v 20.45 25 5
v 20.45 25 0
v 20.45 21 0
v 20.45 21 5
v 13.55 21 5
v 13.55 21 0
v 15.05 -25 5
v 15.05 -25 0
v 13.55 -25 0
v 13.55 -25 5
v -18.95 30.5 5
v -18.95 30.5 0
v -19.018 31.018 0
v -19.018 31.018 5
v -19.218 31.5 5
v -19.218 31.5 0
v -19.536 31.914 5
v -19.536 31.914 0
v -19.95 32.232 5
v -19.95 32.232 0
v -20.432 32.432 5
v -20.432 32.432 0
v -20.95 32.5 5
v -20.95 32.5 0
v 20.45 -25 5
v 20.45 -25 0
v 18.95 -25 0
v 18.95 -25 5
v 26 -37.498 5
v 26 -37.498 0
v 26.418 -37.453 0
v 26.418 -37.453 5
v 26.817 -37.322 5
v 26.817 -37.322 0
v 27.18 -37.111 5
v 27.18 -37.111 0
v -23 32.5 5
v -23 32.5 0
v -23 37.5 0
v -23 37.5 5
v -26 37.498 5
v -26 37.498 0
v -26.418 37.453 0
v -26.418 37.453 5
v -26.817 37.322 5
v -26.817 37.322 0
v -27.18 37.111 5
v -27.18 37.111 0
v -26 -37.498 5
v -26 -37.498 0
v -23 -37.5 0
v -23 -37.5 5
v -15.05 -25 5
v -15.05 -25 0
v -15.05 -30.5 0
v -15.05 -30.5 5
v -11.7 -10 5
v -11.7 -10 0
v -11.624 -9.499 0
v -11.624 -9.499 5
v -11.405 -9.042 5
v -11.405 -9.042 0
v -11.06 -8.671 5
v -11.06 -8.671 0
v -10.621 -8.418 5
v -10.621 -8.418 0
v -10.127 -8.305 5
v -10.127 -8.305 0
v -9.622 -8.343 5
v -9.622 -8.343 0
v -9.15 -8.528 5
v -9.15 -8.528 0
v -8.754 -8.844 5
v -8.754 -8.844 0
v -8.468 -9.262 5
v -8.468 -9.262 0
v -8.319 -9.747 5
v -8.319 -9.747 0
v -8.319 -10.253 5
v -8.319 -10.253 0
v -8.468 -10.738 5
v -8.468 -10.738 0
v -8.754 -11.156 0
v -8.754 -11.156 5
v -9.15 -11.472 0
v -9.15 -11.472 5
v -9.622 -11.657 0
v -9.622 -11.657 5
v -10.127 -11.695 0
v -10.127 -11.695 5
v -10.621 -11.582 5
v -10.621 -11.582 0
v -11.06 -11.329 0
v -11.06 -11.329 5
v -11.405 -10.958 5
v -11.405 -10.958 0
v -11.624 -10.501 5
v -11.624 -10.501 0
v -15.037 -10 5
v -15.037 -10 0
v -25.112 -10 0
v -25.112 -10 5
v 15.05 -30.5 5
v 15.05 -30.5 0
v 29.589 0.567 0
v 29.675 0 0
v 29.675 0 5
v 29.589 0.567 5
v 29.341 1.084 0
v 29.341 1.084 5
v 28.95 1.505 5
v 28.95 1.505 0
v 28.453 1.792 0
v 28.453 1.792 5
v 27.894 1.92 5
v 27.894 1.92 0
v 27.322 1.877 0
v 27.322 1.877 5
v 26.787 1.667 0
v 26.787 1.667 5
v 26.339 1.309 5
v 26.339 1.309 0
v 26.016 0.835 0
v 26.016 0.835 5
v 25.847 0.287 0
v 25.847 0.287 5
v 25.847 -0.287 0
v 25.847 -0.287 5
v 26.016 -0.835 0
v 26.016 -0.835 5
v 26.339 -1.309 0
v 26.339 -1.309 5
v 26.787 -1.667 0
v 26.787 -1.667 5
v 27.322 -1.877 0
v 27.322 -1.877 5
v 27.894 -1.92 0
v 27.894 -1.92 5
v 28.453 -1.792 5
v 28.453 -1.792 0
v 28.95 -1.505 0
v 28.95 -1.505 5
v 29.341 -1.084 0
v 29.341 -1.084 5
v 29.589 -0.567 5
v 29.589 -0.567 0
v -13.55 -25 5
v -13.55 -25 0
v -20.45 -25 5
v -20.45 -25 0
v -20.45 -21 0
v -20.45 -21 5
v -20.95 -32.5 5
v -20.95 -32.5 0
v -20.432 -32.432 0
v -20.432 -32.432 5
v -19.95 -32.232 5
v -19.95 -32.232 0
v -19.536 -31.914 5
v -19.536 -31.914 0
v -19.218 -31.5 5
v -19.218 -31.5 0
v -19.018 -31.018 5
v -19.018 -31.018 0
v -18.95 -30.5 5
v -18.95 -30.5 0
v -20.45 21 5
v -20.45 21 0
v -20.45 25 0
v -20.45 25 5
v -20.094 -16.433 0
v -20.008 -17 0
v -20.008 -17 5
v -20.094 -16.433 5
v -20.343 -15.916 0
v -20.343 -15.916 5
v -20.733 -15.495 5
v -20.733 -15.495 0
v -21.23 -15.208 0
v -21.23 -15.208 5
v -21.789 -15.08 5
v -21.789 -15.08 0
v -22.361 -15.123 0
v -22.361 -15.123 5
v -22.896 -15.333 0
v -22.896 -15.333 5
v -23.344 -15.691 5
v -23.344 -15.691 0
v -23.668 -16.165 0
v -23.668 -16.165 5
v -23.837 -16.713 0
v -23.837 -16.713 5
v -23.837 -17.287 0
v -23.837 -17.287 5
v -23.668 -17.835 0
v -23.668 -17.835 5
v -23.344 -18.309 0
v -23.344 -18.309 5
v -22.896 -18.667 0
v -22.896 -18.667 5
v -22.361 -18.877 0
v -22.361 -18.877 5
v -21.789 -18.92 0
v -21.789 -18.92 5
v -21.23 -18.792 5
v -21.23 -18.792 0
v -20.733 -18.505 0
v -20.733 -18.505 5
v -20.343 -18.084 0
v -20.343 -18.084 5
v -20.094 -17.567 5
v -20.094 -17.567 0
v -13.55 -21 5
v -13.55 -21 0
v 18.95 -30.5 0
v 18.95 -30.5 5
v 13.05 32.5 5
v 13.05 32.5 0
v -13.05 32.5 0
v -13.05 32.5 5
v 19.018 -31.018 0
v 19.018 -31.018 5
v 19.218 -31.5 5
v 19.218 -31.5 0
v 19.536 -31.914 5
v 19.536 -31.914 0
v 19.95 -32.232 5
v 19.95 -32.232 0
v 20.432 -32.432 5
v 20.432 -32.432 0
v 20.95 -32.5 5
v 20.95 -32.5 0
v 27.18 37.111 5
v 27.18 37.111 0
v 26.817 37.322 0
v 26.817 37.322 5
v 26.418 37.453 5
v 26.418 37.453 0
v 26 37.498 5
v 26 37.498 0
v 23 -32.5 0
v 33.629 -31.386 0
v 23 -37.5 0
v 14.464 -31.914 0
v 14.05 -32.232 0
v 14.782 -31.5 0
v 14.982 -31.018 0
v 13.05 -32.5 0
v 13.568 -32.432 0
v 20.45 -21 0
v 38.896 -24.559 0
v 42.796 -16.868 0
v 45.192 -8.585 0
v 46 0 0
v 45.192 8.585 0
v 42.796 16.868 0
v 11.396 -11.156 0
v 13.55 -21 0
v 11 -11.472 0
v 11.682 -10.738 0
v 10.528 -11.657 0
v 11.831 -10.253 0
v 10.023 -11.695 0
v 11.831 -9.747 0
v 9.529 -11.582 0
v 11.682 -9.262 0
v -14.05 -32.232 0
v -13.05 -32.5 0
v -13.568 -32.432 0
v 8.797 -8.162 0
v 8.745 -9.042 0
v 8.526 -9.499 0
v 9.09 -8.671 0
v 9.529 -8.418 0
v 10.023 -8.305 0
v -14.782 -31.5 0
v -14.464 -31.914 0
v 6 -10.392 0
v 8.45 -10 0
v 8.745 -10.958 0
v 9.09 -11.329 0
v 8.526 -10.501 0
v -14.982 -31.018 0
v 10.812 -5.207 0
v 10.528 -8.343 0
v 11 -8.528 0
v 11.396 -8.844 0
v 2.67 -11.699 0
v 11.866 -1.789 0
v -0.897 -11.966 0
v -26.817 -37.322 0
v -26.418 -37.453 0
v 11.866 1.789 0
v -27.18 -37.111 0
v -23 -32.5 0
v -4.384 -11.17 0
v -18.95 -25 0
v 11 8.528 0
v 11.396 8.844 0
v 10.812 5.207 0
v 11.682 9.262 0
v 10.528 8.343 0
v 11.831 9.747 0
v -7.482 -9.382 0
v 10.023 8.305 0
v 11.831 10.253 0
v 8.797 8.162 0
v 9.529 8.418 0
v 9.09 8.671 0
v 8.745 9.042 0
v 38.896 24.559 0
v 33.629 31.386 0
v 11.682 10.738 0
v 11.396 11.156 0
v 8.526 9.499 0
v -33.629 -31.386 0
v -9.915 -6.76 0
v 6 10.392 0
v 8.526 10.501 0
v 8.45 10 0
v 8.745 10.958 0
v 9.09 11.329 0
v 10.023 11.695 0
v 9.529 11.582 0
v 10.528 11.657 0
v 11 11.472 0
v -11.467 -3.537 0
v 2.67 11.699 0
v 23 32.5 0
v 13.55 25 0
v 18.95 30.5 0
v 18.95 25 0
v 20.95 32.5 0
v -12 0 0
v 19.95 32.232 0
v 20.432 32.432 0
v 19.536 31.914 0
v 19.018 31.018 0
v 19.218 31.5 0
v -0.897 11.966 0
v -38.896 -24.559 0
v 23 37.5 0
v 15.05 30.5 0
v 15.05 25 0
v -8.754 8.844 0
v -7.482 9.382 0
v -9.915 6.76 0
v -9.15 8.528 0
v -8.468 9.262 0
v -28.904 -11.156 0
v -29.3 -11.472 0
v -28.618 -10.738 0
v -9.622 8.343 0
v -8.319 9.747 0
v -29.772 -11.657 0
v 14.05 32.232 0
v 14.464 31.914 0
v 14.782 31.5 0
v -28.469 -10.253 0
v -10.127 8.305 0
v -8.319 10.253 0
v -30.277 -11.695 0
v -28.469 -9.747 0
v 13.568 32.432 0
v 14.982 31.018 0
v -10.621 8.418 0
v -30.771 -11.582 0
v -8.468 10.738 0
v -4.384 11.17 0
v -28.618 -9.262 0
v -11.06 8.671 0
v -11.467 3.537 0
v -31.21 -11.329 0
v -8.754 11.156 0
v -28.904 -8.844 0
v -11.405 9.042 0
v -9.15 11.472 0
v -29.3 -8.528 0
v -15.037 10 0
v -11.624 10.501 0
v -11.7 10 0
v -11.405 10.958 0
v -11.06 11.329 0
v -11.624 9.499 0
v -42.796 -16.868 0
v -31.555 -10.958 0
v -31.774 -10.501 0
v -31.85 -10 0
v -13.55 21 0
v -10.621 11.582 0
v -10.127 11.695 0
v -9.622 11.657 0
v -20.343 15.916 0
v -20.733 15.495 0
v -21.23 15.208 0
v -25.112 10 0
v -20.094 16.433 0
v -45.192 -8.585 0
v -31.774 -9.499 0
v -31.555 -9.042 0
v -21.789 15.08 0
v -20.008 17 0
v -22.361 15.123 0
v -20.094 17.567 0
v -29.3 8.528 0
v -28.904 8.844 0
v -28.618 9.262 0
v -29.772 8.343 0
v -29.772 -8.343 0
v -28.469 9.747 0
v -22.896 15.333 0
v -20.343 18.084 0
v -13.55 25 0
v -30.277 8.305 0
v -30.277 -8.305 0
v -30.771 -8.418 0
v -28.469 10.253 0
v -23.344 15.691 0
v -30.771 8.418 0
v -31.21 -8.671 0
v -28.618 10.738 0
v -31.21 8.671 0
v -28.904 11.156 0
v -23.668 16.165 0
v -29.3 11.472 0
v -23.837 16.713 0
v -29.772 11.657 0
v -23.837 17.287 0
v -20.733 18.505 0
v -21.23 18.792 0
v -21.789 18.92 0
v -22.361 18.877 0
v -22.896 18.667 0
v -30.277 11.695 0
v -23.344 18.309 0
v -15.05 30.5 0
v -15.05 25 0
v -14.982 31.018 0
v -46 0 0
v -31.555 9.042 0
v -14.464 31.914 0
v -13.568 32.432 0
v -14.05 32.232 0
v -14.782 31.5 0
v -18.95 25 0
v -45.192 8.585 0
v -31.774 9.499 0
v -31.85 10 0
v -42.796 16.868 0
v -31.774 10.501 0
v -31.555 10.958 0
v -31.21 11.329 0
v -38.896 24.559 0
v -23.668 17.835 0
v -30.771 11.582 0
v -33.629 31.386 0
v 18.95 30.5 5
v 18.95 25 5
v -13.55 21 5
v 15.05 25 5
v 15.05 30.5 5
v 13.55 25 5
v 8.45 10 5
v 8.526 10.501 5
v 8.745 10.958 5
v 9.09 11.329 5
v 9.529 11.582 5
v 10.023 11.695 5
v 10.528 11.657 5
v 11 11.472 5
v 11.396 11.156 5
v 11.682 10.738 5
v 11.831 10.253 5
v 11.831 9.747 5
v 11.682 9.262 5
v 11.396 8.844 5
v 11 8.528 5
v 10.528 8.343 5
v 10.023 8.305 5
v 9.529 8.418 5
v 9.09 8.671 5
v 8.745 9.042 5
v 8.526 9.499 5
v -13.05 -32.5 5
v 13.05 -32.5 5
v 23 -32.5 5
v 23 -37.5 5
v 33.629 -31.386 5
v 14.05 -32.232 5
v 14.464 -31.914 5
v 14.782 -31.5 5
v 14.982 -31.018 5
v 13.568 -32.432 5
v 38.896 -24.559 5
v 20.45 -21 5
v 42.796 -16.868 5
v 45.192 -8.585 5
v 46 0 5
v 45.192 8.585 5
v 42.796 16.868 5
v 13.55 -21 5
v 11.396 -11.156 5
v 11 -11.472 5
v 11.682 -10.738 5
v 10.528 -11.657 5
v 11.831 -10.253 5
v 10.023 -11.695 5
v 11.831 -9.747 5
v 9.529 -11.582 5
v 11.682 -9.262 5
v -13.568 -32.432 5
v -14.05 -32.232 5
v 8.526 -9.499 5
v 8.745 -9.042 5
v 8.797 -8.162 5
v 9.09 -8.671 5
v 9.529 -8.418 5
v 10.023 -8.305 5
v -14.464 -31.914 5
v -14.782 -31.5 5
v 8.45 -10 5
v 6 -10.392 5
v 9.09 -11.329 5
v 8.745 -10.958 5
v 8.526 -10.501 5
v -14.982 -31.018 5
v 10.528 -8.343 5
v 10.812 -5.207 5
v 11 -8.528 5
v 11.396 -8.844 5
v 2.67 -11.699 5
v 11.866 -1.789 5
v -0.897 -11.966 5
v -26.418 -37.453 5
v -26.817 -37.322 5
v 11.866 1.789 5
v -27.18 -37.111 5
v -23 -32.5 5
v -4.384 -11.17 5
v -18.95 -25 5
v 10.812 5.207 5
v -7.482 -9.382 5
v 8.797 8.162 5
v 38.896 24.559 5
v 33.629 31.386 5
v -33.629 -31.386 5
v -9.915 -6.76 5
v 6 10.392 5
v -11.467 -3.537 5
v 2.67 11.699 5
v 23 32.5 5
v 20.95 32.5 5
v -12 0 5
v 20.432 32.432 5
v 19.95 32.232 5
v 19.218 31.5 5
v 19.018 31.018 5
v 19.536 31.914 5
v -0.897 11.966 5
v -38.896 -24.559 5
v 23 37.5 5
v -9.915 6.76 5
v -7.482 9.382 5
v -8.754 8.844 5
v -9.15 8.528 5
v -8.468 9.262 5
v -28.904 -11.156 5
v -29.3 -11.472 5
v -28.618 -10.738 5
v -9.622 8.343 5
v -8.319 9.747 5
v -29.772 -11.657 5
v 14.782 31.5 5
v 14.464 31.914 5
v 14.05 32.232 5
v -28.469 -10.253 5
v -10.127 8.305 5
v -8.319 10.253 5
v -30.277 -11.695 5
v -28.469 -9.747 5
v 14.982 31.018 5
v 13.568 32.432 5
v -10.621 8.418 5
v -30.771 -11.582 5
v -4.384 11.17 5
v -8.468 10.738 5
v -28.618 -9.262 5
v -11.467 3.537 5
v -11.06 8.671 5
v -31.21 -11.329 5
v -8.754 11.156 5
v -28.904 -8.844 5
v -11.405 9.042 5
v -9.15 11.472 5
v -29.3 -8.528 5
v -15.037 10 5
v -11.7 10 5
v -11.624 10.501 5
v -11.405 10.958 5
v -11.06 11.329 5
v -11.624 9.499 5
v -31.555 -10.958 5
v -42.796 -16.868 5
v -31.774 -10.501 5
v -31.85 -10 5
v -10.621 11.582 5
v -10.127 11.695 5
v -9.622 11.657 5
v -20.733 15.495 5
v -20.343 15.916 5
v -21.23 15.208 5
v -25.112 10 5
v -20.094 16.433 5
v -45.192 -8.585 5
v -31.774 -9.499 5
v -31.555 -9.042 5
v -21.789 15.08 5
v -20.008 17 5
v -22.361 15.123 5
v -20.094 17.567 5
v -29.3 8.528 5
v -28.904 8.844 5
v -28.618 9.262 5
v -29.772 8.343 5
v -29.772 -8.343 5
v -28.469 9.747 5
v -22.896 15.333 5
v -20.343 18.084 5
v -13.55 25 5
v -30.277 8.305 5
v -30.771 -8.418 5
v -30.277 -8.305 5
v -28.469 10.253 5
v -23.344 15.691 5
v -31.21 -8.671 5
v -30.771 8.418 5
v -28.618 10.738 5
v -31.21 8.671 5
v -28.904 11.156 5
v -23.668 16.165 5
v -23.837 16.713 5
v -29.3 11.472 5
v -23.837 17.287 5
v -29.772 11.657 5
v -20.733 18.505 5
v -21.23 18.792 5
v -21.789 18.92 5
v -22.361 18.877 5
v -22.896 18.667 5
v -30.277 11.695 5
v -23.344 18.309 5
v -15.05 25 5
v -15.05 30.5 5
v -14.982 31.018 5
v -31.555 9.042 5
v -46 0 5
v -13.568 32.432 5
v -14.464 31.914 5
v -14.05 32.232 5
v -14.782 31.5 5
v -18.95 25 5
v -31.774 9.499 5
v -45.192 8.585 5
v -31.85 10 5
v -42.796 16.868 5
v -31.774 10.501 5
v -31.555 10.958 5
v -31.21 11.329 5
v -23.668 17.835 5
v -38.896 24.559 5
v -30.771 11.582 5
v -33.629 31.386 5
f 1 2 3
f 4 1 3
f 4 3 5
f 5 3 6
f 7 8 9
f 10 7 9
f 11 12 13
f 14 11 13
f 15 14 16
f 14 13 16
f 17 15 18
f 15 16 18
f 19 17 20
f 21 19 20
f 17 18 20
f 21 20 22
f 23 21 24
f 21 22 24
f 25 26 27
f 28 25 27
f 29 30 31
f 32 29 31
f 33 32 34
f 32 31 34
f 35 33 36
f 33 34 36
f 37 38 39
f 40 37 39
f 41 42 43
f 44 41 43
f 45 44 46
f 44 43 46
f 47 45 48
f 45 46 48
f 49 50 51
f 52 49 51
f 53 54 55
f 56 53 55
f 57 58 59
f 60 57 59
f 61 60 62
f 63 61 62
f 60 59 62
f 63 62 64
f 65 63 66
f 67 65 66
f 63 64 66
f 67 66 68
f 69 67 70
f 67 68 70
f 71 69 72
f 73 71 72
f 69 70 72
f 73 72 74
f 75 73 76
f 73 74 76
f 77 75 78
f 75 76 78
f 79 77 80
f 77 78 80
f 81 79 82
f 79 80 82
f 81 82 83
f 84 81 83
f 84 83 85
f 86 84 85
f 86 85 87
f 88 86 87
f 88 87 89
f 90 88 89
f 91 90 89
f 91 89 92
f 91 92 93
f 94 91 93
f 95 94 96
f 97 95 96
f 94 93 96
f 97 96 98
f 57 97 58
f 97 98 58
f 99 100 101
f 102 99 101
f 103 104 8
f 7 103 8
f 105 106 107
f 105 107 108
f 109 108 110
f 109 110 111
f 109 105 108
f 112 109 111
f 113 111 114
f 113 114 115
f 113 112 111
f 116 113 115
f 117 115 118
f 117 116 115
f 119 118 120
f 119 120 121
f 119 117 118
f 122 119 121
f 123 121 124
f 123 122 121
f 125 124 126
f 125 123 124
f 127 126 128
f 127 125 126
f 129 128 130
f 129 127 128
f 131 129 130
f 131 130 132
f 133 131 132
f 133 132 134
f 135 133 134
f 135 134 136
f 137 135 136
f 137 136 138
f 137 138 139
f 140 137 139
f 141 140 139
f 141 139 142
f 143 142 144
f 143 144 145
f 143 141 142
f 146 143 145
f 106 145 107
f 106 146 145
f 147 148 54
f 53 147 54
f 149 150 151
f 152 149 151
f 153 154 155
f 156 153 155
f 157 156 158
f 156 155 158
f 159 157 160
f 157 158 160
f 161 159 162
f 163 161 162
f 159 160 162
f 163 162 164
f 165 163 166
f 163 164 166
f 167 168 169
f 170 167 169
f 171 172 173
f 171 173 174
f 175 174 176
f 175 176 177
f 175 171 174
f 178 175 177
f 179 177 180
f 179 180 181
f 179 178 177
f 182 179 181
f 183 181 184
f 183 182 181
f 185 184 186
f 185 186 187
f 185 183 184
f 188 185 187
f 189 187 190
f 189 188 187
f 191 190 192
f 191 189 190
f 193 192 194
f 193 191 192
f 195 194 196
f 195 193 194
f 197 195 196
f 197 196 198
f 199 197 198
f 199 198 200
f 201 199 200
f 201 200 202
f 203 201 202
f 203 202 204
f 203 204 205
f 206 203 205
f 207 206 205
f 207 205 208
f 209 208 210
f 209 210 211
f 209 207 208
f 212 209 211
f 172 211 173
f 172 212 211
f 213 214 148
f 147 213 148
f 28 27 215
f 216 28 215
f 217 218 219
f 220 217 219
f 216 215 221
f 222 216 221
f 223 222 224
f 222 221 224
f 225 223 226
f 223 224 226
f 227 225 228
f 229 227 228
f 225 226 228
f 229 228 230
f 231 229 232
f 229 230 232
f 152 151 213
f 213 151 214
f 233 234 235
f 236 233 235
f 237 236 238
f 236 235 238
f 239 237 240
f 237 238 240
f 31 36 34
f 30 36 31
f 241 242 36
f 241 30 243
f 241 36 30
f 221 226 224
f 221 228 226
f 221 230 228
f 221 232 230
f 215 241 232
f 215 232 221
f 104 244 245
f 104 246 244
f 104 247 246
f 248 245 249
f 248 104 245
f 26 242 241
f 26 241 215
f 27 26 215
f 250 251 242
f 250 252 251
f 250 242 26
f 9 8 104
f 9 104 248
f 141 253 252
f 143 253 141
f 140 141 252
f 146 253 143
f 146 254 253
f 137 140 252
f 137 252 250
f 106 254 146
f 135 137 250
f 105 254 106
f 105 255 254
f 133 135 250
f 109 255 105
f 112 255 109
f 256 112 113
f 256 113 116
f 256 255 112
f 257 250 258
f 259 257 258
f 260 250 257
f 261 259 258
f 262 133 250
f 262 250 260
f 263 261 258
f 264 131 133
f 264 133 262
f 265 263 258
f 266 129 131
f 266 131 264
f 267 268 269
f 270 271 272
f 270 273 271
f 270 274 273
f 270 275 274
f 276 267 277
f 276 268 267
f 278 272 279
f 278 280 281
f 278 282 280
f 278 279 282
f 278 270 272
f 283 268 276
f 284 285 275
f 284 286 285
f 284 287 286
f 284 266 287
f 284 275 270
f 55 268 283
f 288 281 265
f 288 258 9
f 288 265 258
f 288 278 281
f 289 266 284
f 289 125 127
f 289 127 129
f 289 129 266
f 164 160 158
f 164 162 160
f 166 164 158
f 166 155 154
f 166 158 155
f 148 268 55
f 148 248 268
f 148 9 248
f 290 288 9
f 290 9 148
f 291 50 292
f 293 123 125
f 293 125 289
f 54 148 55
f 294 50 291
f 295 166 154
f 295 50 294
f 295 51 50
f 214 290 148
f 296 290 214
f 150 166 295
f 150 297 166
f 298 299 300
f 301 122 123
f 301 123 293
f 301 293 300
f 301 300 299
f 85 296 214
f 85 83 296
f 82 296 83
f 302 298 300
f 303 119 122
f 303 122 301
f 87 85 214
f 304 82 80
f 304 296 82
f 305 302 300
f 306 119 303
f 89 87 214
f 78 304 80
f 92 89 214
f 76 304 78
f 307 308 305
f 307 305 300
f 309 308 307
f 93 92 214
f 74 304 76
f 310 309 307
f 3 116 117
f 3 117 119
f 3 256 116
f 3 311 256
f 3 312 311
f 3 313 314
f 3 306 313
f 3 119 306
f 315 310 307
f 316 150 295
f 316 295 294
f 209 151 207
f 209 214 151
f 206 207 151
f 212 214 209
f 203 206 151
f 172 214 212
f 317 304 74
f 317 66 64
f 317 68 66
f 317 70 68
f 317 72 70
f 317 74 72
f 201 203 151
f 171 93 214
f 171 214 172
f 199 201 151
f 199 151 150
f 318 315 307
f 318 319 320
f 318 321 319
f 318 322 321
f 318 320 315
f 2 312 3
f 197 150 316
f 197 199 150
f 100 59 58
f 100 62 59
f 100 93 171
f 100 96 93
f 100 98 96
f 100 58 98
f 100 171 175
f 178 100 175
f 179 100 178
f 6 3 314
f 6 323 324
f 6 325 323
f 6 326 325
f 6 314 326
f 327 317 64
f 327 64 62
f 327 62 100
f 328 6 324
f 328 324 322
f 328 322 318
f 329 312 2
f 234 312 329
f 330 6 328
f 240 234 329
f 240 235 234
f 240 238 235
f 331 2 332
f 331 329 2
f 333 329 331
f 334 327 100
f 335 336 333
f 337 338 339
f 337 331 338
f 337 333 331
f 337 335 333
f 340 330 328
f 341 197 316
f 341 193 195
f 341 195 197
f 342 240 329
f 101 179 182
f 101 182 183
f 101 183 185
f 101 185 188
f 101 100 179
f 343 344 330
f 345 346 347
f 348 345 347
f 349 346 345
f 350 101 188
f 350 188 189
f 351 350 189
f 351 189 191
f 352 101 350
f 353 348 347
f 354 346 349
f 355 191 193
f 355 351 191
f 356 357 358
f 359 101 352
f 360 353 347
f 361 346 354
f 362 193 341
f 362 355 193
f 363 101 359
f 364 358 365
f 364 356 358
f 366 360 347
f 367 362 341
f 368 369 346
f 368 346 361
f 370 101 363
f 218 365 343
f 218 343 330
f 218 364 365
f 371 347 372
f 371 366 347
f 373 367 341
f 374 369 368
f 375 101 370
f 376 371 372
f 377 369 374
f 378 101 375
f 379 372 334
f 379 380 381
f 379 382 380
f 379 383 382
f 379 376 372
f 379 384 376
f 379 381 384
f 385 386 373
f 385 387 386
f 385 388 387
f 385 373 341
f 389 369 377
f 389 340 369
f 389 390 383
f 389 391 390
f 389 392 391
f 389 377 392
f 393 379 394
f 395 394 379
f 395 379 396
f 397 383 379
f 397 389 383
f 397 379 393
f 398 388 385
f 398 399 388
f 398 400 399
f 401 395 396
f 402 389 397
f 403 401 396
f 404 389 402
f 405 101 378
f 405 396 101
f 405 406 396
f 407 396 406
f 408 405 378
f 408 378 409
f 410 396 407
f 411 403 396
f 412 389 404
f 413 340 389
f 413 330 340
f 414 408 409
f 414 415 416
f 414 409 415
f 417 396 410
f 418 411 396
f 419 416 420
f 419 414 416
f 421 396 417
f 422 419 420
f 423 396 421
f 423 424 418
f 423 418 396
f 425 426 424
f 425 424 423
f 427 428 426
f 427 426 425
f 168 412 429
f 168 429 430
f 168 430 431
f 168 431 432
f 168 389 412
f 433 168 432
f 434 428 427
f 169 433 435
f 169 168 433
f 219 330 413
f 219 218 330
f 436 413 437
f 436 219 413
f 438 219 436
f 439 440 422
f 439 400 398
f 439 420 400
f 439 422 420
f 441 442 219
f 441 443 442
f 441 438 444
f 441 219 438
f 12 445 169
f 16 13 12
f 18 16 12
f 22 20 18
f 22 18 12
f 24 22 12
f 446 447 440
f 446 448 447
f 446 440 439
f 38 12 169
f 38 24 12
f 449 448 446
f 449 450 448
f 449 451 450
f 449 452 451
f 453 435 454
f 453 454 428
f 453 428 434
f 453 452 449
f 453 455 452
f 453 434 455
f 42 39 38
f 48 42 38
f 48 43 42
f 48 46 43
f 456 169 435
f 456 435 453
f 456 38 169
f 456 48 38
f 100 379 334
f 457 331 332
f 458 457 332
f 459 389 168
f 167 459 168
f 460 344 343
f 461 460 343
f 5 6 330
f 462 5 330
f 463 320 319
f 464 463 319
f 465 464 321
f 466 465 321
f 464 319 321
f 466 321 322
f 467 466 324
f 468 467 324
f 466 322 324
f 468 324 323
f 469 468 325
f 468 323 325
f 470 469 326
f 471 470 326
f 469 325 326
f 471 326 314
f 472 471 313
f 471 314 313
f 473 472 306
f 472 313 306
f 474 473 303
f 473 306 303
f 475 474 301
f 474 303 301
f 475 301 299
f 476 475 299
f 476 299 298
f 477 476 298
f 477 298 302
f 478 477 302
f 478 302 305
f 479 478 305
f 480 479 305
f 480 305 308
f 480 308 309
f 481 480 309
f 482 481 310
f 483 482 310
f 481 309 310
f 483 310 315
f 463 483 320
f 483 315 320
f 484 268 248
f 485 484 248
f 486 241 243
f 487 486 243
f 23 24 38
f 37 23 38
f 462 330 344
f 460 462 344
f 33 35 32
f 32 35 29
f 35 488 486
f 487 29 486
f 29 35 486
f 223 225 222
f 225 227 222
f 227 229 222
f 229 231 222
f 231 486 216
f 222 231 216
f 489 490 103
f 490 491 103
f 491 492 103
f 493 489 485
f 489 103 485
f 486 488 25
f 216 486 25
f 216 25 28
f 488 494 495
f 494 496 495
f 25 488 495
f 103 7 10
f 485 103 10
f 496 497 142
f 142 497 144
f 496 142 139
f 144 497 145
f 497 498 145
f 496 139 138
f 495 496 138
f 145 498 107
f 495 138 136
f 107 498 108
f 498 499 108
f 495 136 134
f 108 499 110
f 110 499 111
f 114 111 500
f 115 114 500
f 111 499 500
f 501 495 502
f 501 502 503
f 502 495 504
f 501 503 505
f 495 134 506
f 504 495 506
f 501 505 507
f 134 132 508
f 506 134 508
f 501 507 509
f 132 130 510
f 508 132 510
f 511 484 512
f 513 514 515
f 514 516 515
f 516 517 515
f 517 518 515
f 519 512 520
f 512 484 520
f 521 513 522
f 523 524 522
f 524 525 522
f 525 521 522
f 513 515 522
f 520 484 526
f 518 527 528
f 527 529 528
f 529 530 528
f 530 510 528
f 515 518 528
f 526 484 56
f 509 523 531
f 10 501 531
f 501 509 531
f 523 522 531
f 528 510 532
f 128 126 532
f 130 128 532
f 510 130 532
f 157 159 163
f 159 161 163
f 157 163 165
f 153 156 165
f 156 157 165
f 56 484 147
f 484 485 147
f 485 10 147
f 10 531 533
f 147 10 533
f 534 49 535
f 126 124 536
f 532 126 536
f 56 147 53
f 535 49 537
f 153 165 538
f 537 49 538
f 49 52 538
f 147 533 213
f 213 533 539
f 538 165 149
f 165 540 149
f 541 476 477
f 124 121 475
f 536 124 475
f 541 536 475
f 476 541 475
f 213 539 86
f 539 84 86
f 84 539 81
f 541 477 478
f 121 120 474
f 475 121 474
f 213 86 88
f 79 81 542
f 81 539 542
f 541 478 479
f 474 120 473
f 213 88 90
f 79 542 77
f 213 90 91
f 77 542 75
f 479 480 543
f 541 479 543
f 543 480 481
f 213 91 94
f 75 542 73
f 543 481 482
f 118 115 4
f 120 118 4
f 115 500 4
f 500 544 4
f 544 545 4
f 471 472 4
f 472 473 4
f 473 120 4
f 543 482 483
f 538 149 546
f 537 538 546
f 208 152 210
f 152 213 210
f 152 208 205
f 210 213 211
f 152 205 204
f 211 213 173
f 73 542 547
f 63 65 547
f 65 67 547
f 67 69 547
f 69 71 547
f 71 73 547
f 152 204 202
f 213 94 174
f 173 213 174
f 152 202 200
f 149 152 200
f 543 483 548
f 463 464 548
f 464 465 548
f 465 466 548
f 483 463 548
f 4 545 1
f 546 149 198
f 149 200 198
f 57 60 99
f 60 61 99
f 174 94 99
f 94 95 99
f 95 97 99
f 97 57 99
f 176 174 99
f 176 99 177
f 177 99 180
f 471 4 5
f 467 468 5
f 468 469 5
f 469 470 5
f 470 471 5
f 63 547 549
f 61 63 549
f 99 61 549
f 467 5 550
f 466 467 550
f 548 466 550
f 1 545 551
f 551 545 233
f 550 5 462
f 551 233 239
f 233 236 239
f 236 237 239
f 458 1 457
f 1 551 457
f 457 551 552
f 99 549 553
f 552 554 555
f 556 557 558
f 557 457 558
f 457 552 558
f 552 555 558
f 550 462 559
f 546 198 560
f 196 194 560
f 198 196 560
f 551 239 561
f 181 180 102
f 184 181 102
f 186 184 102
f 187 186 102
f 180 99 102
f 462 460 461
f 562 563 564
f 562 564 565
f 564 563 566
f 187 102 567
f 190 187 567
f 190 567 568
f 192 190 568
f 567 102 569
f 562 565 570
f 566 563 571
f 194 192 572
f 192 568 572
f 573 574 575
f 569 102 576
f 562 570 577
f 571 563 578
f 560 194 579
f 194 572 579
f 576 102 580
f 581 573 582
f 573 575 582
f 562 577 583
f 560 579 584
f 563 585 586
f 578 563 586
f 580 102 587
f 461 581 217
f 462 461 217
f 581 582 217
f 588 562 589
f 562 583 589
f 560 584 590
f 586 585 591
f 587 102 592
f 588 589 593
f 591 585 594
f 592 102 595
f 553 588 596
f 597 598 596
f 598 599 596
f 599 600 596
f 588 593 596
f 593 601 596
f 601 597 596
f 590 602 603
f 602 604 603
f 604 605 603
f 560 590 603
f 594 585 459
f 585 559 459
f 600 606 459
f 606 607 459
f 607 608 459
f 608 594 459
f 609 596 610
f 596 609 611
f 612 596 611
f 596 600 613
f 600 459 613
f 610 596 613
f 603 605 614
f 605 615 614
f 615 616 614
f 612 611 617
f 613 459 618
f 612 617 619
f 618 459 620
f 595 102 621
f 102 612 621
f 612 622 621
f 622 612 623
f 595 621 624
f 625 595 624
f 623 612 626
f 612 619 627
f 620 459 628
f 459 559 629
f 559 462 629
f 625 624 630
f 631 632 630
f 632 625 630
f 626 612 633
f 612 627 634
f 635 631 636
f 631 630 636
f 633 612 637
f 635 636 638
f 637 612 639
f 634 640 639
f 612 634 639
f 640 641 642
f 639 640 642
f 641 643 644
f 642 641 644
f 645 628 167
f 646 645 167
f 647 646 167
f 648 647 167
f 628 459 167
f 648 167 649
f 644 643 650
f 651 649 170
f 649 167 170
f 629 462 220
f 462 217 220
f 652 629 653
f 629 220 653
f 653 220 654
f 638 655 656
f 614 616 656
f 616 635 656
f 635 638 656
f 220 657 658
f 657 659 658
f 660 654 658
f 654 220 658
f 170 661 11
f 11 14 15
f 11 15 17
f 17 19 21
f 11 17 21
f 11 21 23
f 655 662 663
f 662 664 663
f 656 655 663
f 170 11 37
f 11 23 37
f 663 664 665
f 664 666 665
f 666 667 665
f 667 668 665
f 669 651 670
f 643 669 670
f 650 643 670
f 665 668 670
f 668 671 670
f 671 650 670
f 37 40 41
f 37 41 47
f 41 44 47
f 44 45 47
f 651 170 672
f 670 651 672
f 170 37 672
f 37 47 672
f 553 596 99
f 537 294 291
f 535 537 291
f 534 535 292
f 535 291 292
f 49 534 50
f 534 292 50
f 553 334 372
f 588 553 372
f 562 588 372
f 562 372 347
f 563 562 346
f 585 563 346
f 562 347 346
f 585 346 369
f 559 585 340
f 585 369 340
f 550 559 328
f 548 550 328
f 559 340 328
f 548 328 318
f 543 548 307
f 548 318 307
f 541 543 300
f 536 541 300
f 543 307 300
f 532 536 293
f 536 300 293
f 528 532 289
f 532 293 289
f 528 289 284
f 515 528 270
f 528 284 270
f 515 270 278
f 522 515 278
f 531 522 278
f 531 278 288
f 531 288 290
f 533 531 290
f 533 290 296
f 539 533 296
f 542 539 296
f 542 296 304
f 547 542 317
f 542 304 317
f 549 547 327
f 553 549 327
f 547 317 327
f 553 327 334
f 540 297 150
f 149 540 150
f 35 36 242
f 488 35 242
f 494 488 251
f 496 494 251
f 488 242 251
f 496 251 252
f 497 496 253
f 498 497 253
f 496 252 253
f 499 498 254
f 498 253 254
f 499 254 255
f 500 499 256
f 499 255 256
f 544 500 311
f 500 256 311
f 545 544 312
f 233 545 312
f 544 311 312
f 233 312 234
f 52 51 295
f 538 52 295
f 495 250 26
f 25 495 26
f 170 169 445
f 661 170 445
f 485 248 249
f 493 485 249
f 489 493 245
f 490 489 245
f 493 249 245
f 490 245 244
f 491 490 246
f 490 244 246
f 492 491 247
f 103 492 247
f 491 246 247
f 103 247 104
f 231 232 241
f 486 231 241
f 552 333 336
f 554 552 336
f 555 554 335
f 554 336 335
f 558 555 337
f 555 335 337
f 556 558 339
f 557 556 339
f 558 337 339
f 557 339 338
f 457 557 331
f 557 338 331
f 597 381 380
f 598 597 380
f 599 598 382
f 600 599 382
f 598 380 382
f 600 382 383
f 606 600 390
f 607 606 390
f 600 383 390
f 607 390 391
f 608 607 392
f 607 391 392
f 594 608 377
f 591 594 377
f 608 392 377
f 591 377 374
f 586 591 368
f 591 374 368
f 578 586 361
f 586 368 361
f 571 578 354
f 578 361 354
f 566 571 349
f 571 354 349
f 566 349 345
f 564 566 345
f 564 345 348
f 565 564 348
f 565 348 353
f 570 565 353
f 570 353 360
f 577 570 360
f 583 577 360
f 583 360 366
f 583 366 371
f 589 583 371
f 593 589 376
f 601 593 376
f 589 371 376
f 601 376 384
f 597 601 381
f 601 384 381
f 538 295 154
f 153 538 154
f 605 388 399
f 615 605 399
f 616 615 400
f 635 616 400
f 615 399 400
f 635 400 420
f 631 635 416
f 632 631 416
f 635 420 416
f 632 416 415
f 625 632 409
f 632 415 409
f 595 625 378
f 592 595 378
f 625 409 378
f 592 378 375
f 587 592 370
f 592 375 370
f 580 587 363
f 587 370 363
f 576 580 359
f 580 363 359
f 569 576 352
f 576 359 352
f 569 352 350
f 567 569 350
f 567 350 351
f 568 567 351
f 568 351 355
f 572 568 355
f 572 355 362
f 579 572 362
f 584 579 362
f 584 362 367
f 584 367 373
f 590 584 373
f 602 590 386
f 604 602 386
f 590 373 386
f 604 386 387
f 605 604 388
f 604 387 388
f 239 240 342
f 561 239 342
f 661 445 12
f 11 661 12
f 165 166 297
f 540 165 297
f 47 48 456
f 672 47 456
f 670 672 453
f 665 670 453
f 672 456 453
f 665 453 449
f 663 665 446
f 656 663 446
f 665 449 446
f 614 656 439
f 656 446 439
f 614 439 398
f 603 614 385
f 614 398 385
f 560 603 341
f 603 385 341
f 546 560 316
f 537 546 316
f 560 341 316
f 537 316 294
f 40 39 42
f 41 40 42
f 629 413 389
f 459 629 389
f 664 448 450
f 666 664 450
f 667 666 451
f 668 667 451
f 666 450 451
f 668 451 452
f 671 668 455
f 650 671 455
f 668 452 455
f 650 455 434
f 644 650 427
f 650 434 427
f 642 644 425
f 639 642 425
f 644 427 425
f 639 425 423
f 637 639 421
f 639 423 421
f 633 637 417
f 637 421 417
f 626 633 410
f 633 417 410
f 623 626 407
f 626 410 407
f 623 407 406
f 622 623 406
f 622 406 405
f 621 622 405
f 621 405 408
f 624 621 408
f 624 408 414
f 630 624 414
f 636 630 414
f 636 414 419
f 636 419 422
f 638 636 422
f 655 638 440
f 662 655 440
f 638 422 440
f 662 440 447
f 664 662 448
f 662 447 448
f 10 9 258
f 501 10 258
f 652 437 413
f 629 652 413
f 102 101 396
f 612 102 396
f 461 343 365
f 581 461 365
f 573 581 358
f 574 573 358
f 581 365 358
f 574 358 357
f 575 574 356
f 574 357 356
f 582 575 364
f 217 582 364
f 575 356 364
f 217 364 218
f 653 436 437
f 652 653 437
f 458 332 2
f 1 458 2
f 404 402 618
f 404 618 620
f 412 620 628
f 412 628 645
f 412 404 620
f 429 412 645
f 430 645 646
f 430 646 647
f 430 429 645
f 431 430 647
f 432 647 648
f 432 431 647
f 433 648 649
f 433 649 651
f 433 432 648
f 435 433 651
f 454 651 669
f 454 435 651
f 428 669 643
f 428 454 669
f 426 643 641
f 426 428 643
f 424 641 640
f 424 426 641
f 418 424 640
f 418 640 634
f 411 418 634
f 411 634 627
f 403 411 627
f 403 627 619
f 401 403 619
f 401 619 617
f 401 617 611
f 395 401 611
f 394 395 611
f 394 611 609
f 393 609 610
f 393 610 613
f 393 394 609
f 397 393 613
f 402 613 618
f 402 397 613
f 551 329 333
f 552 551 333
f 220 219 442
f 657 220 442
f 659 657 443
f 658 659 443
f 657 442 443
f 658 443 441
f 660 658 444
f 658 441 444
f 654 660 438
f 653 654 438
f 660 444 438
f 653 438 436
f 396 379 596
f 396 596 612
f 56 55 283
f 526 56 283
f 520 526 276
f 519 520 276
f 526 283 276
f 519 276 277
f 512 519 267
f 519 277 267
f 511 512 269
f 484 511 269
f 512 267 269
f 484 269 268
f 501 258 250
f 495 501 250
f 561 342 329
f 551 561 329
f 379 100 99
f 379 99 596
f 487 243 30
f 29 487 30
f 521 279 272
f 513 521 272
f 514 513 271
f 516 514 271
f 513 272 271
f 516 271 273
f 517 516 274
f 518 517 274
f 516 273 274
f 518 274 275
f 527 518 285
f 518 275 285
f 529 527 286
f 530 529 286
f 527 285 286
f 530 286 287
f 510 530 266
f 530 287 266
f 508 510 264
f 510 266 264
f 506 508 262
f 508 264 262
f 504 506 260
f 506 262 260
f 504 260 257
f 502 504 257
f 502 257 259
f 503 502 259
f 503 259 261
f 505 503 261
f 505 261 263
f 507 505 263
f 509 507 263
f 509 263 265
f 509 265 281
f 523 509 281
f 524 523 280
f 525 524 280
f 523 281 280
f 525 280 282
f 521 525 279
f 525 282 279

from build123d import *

# Parameters (mm, degrees)
ESQUISSE1_R         = 1.925
BOSS_EXTRU_1_DEPTH  = 5
SKETCH_1_W          = 8.010899758
SKETCH_1_H          = 5.2
SKETCH_1_W_2        = 7.665468451
EXTRUDE_1_DEPTH     = 5
SKETCH_2_W          = 8.485253828
SKETCH_2_H          = 20
EXTRUDE_2_DEPTH     = 5
SKETCH_3_R          = 1.6
CUT_EXTRUDE_1_DEPTH = 5
EXTRUDE_3_DEPTH     = 5
SKETCH_6_R          = 12
SKETCH_6_W          = 10.075
SKETCH_6_H          = 20
CUT_EXTRUDE_2_DEPTH = 5
SKETCH_7_R          = 1.7
SKETCH_7_R_2        = 11
CUT_EXTRUDE_3_DEPTH = 5


with BuildPart() as part:
    # Esquisse1 → Boss.-Extru.1 (new body)
    with BuildSketch(Plane.XY):
        with BuildLine():
            Line((13.05, 32.5), (-13.05, 32.5))
            ThreePointArc((-13.05, 32.5), (-14.464213562, 31.914213562), (-15.05, 30.5))
            Line((-15.05, 30.5), (-15.05, 25))
            Line((-15.05, 25), (-13.55, 25))
            Line((-13.55, 25), (-13.55, 21))
            Line((-13.55, 21), (-20.45, 21))
            Line((-20.45, 21), (-20.45, 25))
            Line((-20.45, 25), (-18.95, 25))
            Line((-18.95, 25), (-18.95, 30.5))
            ThreePointArc((-18.95, 30.5), (-19.535786438, 31.914213562), (-20.95, 32.5))
            Line((-20.95, 32.5), (-23, 32.5))
            Line((-23, 32.5), (-23, 37.5))
            Line((-23, 37.5), (-25.999999067, 37.497633905))
            ThreePointArc((-25.999999067, 37.497633905), (-26.620839292, 37.398317642), (-27.180168114, 37.111163374))
            ThreePointArc((-27.180168114, 37.111163374), (-45.999999844, 0), (-27.180168114, -37.111163374))
            ThreePointArc((-27.180168114, -37.111163374), (-26.620839292, -37.398317642), (-25.999999067, -37.497633905))
            Line((-25.999999067, -37.497633905), (-23, -37.5))
            Line((-23, -37.5), (-23, -32.5))
            Line((-23, -32.5), (-20.95, -32.5))
            ThreePointArc((-20.95, -32.5), (-19.535786438, -31.914213562), (-18.95, -30.5))
            Line((-18.95, -30.5), (-18.95, -25))
            Line((-18.95, -25), (-20.45, -25))
            Line((-20.45, -25), (-20.45, -21))
            Line((-20.45, -21), (-13.55, -21))
            Line((-13.55, -21), (-13.55, -25))
            Line((-13.55, -25), (-15.05, -25))
            Line((-15.05, -25), (-15.05, -30.5))
            ThreePointArc((-15.05, -30.5), (-14.464213562, -31.914213562), (-13.05, -32.5))
            Line((-13.05, -32.5), (13.05, -32.5))
            ThreePointArc((13.05, -32.5), (14.464213562, -31.914213562), (15.05, -30.5))
            Line((15.05, -30.5), (15.05, -25))
            Line((15.05, -25), (13.55, -25))
            Line((13.55, -25), (13.55, -21))
            Line((13.55, -21), (20.45, -21))
            Line((20.45, -21), (20.45, -25))
            Line((20.45, -25), (18.95, -25))
            Line((18.95, -25), (18.95, -30.5))
            ThreePointArc((18.95, -30.5), (19.535786438, -31.914213562), (20.95, -32.5))
            Line((20.95, -32.5), (23, -32.5))
            Line((23, -32.5), (23, -37.5))
            Line((23, -37.5), (25.999999067, -37.497633905))
            ThreePointArc((25.999999067, -37.497633905), (26.620839292, -37.398317642), (27.180168114, -37.111163374))
            ThreePointArc((27.180168114, -37.111163374), (45.999999844, 0), (27.180168114, 37.111163374))
            ThreePointArc((27.180168114, 37.111163374), (26.620839292, 37.398317642), (25.999999067, 37.497633905))
            Line((25.999999067, 37.497633905), (23, 37.5))
            Line((23, 37.5), (23, 32.5))
            Line((23, 32.5), (20.95, 32.5))
            ThreePointArc((20.95, 32.5), (19.535786438, 31.914213562), (18.95, 30.5))
            Line((18.95, 30.5), (18.95, 25))
            Line((18.95, 25), (20.45, 25))
            Line((20.45, 25), (20.45, 21))
            Line((20.45, 21), (13.55, 21))
            Line((13.55, 21), (13.55, 25))
            Line((13.55, 25), (15.05, 25))
            Line((15.05, 25), (15.05, 30.5))
            ThreePointArc((15.05, 30.5), (14.464213562, 31.914213562), (13.05, 32.5))
        make_face()
        with Locations((27.75, 0)):
            Circle(ESQUISSE1_R, mode=Mode.SUBTRACT)
        with Locations((-21.933137835, -17)):
            Circle(ESQUISSE1_R, mode=Mode.SUBTRACT)
        with Locations((-21.933137835, 17)):
            Circle(ESQUISSE1_R, mode=Mode.SUBTRACT)
        with Locations((14.500000149, -5)):
            Circle(ESQUISSE1_R, mode=Mode.SUBTRACT)
        with Locations((14.500000149, 5)):
            Circle(ESQUISSE1_R, mode=Mode.SUBTRACT)
        with Locations((-34.499999851, -5)):
            Circle(ESQUISSE1_R, mode=Mode.SUBTRACT)
        with Locations((-34.499999851, 5)):
            Circle(ESQUISSE1_R, mode=Mode.SUBTRACT)
        with BuildLine():
            Line((10.150000149, -10), (10.150000149, -2.6))
            ThreePointArc((10.150000149, -2.6), (10.735786586, -1.185786438), (12.150000149, -0.6))
            Line((12.150000149, -0.6), (16.500000149, -0.6))
            ThreePointArc((16.500000149, -0.6), (17.100000149, 0), (16.500000149, 0.6))
            Line((16.500000149, 0.6), (12.150000149, 0.6))
            ThreePointArc((12.150000149, 0.6), (10.735786586, 1.185786438), (10.150000149, 2.6))
            Line((10.150000149, 2.6), (10.150000149, 10))
            Line((10.150000149, 10), (-30.149999851, 10))
            Line((-30.149999851, 10), (-30.149999851, 2.6))
            ThreePointArc((-30.149999851, 2.6), (-30.735786289, 1.185786438), (-32.149999851, 0.6))
            Line((-32.149999851, 0.6), (-36.499999851, 0.6))
            ThreePointArc((-36.499999851, 0.6), (-37.099999851, 0), (-36.499999851, -0.6))
            Line((-36.499999851, -0.6), (-32.149999851, -0.6))
            ThreePointArc((-32.149999851, -0.6), (-30.735786289, -1.185786438), (-30.149999851, -2.6))
            Line((-30.149999851, -2.6), (-30.149999851, -10))
            Line((-30.149999851, -10), (10.150000149, -10))
        make_face(mode=Mode.SUBTRACT)
    extrude(amount=BOSS_EXTRU_1_DEPTH)

    # 草图1 → 凸台-拉伸1 (add)
    with BuildSketch(Plane(origin=(0, 0, 0), x_dir=(-1, 0, 0), z_dir=(0, 0, -1))):
        with Locations((34.15544973, 0)):
            Rectangle(SKETCH_1_W, SKETCH_1_H)
        with Locations((-13.982734375, 0)):
            Rectangle(SKETCH_1_W_2, SKETCH_1_H)
    extrude(amount=-EXTRUDE_1_DEPTH)

    # 草图2 → 凸台-拉伸2 (add)
    with BuildSketch(Plane(origin=(0, 0, 0), x_dir=(-1, 0, 0), z_dir=(0, 0, -1))):
        Polygon((-10.150000149, 10), (-18.078472642, 10), (-18.078472642, -9.561252325), (-10.150000149, -10), align=None)
        with Locations((34.392626765, 0)):
            Rectangle(SKETCH_2_W, SKETCH_2_H)
    extrude(amount=-EXTRUDE_2_DEPTH)

    # 草图3 → 切除-拉伸1 (cut)
    with BuildSketch(Plane(origin=(0, 0, 0), x_dir=(-1, 0, 0), z_dir=(0, 0, -1))):
        with Locations((30.149999851, 10)):
            Circle(SKETCH_3_R)
        with Locations((30.149999851, -10)):
            Circle(SKETCH_3_R)
        with Locations((-10.150000149, 10)):
            Circle(SKETCH_3_R)
        with Locations((-10.150000149, -10)):
            Circle(SKETCH_3_R)
        with Locations((9.999999851, -10)):
            Circle(SKETCH_3_R)
        with Locations((9.999999851, 10)):
            Circle(SKETCH_3_R)
    extrude(amount=-CUT_EXTRUDE_1_DEPTH, mode=Mode.SUBTRACT)

    # 草图5 → 凸台-拉伸3 (add)
    with BuildSketch(Plane(origin=(0, 0, 0), x_dir=(-1, 0, 0), z_dir=(0, 0, -1))):
        with BuildLine():
            Line((30.149999851, -8.4), (30.149999851, 8.4))
            ThreePointArc((30.149999851, 8.4), (29.018629001, 8.86862915), (28.549999851, 10))
            Line((28.549999851, 10), (11.599999851, 10))
            ThreePointArc((11.599999851, 10), (9.999999851, 8.4), (8.399999851, 10))
            Line((8.399999851, 10), (-8.550000149, 10))
            ThreePointArc((-8.550000149, 10), (-9.018629299, 8.86862915), (-10.150000149, 8.4))
            Line((-10.150000149, 8.4), (-10.150000149, -8.4))
            ThreePointArc((-10.150000149, -8.4), (-9.018629299, -8.86862915), (-8.550000149, -10))
            Line((-8.550000149, -10), (8.399999851, -10))
            ThreePointArc((8.399999851, -10), (9.999999851, -8.4), (11.599999851, -10))
            Line((11.599999851, -10), (28.549999851, -10))
            ThreePointArc((28.549999851, -10), (29.018629001, -8.86862915), (30.149999851, -8.4))
        make_face()
    extrude(amount=-EXTRUDE_3_DEPTH)

    # 草图6 → 切除-拉伸2 (cut)
    with BuildSketch(Plane(origin=(0, 0, 0), x_dir=(-1, 0, 0), z_dir=(0, 0, -1))):
        Circle(SKETCH_6_R)
        with Locations((20.074999851, 0)):
            Rectangle(SKETCH_6_W, SKETCH_6_H)
    extrude(amount=-CUT_EXTRUDE_2_DEPTH, mode=Mode.SUBTRACT)

    # 草图7 → 切除-拉伸3 (cut)
    with BuildSketch(Plane(origin=(0, 0, 0), x_dir=(-1, 0, 0), z_dir=(0, 0, -1))):
        with Locations((-10.150000149, 10)):
            Circle(SKETCH_7_R)
        with Locations((9.999999851, 10)):
            Circle(SKETCH_7_R)
        with Locations((-10.150000149, -10)):
            Circle(SKETCH_7_R)
        with Locations((9.999999851, -10)):
            Circle(SKETCH_7_R)
        with Locations((30.149999851, -10)):
            Circle(SKETCH_7_R)
        with Locations((30.149999851, 10)):
            Circle(SKETCH_7_R)
        Circle(SKETCH_7_R_2)
    extrude(amount=-CUT_EXTRUDE_3_DEPTH, mode=Mode.SUBTRACT)


solid = part.part
